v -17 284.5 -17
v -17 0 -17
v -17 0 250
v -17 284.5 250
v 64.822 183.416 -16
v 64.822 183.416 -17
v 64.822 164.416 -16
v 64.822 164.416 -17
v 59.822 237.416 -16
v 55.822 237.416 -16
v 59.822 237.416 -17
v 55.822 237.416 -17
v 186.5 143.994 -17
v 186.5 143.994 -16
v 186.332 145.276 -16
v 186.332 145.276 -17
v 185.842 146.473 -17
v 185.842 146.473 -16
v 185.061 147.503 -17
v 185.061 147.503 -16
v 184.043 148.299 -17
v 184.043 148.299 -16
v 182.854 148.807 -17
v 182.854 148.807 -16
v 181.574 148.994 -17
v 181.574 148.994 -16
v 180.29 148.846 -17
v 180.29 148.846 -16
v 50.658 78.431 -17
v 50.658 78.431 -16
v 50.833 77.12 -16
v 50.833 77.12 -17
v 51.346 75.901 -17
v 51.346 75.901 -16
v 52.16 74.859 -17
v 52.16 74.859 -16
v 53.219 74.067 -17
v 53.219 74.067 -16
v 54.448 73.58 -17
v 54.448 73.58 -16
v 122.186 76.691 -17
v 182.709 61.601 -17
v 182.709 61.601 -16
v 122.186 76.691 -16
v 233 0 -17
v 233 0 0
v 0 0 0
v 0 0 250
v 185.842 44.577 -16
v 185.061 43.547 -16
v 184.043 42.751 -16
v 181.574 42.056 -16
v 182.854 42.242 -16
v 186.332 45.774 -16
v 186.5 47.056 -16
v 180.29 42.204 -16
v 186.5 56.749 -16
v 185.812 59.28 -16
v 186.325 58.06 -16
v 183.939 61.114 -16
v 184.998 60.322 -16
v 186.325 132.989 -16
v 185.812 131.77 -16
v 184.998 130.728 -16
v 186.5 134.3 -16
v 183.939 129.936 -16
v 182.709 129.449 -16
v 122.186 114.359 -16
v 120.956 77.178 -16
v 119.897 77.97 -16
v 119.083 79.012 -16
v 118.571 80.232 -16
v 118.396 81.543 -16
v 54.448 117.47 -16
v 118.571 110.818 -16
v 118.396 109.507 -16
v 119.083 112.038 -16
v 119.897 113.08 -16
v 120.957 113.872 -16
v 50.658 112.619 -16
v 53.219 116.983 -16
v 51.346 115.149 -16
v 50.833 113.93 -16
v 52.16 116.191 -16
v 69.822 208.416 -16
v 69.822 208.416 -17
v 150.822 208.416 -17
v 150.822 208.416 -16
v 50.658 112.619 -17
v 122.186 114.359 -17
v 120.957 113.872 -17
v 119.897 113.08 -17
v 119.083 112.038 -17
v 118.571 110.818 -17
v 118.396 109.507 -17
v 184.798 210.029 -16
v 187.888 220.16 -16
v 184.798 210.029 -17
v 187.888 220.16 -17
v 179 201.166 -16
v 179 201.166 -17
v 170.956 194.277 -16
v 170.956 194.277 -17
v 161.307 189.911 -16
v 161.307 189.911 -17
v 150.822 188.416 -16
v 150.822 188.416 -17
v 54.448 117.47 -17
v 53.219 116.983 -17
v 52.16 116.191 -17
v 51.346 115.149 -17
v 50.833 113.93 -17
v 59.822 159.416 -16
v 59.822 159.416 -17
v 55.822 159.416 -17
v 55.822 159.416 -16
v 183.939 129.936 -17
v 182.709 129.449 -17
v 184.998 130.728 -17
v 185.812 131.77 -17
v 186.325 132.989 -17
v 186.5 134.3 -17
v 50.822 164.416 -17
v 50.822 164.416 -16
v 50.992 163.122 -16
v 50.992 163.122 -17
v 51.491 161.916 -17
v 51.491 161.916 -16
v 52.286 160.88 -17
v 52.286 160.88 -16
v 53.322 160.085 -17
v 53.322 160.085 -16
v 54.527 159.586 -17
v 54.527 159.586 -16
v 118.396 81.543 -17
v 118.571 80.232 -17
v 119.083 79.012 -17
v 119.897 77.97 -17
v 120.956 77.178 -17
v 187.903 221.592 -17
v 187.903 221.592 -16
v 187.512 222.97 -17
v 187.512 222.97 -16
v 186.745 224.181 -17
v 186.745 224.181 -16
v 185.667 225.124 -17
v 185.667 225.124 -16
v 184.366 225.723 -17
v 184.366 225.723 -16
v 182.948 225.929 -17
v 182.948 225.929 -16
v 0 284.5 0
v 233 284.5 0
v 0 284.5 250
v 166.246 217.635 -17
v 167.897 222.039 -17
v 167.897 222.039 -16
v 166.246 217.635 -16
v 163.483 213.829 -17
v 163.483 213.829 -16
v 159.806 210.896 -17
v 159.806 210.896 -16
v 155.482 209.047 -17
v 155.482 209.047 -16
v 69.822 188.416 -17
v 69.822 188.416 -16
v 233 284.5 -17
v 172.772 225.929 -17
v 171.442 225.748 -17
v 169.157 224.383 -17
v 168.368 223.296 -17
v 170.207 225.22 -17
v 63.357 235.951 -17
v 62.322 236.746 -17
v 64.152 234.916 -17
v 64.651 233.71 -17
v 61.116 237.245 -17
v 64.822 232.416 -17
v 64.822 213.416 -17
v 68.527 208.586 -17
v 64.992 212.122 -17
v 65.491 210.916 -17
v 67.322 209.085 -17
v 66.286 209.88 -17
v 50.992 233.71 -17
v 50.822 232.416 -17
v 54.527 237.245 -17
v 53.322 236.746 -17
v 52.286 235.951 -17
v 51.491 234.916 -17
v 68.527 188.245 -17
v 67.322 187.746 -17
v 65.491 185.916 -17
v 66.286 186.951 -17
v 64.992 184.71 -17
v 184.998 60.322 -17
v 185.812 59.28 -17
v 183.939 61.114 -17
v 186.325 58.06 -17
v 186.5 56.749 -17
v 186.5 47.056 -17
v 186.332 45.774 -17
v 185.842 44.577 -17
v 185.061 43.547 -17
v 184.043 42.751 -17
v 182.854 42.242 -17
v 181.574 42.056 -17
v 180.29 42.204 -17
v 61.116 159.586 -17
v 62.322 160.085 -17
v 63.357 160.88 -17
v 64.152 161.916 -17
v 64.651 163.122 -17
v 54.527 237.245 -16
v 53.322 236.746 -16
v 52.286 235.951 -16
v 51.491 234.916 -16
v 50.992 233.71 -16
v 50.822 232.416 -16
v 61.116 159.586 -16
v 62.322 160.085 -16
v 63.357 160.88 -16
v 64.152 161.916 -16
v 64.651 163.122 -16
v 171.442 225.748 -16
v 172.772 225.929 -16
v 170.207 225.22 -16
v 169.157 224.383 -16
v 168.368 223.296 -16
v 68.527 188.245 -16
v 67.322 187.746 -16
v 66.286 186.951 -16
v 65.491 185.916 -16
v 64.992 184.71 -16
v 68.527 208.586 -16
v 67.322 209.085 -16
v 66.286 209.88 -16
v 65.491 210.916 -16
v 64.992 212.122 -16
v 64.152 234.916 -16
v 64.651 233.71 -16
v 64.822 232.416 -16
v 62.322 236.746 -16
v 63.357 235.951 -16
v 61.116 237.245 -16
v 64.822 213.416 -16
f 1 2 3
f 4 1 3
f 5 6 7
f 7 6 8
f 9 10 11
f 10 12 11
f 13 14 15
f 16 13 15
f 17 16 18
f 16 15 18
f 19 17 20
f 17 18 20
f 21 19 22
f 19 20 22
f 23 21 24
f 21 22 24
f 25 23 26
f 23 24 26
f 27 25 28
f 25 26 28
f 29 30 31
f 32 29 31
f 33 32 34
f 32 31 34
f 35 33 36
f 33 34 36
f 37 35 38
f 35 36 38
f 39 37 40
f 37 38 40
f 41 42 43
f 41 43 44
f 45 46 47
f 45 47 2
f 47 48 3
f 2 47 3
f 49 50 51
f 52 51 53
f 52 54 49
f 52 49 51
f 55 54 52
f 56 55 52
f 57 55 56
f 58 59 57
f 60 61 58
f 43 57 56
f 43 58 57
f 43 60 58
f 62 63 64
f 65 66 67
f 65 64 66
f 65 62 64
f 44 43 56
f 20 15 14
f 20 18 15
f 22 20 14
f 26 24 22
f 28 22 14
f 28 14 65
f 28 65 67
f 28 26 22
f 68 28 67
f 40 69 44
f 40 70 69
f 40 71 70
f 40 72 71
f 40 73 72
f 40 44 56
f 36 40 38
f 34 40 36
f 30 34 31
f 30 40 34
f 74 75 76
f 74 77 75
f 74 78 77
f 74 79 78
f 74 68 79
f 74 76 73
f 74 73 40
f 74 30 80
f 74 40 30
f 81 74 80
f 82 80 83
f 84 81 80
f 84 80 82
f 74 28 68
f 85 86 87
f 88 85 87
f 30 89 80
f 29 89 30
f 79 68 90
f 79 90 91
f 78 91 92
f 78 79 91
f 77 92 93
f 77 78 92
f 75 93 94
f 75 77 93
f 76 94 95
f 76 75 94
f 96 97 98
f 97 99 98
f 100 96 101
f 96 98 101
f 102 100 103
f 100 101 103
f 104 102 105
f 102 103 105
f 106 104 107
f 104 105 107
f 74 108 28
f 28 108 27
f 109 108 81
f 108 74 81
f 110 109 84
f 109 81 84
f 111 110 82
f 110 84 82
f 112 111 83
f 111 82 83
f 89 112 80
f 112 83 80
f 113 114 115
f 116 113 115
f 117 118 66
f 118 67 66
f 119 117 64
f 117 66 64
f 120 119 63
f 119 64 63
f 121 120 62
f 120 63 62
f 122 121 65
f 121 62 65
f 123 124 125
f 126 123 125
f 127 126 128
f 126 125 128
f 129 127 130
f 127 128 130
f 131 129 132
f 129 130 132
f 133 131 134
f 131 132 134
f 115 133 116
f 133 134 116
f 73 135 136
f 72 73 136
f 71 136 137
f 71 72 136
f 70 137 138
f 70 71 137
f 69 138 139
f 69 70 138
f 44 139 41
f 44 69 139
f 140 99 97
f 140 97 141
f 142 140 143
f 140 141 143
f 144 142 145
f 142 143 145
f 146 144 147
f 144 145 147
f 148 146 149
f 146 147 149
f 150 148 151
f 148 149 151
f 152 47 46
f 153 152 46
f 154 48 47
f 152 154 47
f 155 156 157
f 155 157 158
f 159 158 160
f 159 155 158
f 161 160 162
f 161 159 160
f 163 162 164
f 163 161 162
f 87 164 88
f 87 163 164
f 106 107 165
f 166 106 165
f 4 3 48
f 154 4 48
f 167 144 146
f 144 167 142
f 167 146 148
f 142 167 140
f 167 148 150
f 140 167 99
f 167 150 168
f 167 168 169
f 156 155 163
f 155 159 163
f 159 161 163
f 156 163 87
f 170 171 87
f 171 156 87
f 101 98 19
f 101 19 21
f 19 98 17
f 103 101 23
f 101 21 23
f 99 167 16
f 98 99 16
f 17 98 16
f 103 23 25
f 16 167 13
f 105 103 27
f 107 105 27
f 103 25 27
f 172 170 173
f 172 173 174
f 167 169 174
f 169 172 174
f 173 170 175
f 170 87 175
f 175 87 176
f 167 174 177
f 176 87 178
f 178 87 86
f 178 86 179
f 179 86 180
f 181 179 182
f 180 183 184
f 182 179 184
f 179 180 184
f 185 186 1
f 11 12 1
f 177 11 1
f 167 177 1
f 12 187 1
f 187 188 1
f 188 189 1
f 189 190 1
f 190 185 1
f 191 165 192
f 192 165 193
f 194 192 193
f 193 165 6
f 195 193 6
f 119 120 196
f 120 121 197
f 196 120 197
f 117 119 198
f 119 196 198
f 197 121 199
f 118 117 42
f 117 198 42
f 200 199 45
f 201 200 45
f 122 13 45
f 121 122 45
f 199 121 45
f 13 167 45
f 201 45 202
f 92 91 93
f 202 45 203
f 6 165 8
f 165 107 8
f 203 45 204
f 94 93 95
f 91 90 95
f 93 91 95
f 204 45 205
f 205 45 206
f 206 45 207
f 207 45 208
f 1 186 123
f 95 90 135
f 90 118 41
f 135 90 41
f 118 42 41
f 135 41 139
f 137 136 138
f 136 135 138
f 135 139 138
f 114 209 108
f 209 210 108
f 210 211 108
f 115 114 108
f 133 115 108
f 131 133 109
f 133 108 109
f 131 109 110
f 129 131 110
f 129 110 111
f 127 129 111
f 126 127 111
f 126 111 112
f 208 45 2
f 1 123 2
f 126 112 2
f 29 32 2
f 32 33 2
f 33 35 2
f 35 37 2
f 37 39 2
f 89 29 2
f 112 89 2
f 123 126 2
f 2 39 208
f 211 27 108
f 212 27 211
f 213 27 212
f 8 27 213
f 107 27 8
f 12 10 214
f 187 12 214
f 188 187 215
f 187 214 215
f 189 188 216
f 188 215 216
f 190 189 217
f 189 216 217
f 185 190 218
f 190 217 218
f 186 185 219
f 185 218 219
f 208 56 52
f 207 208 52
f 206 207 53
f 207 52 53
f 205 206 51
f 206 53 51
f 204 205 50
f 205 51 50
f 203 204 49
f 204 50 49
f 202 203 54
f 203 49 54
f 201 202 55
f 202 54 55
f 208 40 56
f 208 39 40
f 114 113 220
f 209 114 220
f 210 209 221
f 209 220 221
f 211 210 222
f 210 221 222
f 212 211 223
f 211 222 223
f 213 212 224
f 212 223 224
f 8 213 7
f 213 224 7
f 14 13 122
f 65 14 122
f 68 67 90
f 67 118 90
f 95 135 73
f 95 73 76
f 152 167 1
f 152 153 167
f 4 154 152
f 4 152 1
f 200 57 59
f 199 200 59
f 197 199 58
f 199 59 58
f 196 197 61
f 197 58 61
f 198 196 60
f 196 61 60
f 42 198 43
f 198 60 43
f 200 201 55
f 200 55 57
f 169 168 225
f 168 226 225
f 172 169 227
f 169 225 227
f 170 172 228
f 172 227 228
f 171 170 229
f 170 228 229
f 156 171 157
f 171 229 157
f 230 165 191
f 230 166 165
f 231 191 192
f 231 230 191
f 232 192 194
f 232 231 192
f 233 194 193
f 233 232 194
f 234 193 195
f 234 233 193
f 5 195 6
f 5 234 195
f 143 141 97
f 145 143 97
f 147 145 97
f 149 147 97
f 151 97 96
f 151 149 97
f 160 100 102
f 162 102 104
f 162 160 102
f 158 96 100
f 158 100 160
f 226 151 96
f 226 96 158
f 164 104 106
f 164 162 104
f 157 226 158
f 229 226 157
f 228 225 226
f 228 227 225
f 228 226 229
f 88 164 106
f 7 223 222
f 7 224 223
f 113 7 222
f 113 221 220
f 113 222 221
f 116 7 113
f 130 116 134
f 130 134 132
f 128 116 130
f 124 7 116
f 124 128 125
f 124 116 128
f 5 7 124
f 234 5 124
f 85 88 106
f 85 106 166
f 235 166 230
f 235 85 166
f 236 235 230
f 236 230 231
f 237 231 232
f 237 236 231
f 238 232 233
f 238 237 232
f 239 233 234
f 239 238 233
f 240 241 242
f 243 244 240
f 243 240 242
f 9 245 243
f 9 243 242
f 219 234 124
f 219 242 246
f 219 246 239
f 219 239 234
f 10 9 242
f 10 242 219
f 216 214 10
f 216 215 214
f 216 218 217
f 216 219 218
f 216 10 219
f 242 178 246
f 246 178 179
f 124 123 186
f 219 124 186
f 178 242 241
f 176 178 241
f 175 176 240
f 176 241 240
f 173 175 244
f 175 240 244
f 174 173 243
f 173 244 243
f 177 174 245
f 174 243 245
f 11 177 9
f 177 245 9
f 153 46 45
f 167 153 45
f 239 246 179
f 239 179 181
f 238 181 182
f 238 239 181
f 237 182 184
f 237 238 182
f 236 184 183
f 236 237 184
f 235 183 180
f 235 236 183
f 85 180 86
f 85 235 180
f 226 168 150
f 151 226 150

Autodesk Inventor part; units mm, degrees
ref_plane "YZ Plane" through (0, 0, 0) normal (1, 0, 0) x (0, 1, 0)
ref_plane "XZ Plane" through (0, 0, 0) normal (0, 1, 0) x (-1, 0, 0)
ref_plane "XY Plane" through (0, 0, 0) normal (0, 0, 1) x (1, 0, 0)
sketch "Sketch1" plane through (0, 0, 0) normal (0, 1, 0) x (-1, 0, 0)
  line L0 (17, 250) -> (0, 250)
  line L1 (0, 250) -> (0, 0)
  line L2 (0, 0) -> (17, 0)
  line L3 (17, 0) -> (17, 250)
  line L4 (17, 0) -> (-233, 0)
  line L5 (-233, 0) -> (-233, -17)
  line L6 (-233, -17) -> (17, -17)
  line L7 (17, -17) -> (17, 0)
  dimension "d0" = 17
  dimension "d1" = 250
  dimension "d2" = 250
extrude "Extrusion1" add sketch "Sketch1" along normal blind 284.5
sketch "Sketch2" plane through (233, 0, -17) normal (0, 0, -1) x (-1, 0, 0)
  line L0 (0, 0) -> (250, 0) projected
  line L1 (250, 0) -> (250, 284.5) projected
  line L2 (0, 284.5) -> (250, 284.5) projected
  line L3 (0, 0) -> (0, 284.5) projected
  line L4 (182.1785, 237.4156) -> (168.1785, 237.4156)
  line L5 (168.1785, 237.4156) -> (168.1785, 159.4156)
  line L6 (168.1785, 159.4156) -> (182.1785, 159.4156)
  line L7 (182.1785, 159.4156) -> (182.1785, 237.4156)
  line L8 (168.1785, 208.4156) -> (82.1785, 208.4156)
  line L9 (82.1785, 208.4156) -> (82.1785, 188.4156)
  line L10 (82.1785, 188.4156) -> (168.1785, 188.4156)
  line L11 (168.1785, 188.4156) -> (168.1785, 208.4156)
  arc A0 (64.6656, 225.9286) -> (82.1785, 208.4156) centre (82.1785, 225.9286) ccw
  line L12 (82.1785, 225.9286) -> (64.6656, 225.9286) construction
  line L13 (82.1785, 225.9286) -> (82.1785, 208.4156) construction
  arc A1 (44.6656, 225.9286) -> (82.1785, 188.4156) centre (82.1785, 225.9286) ccw
  line L14 (64.6656, 225.9286) -> (44.6656, 225.9286)
  line L15 (182.3419, 116.525) -> (46.5005, 150.394)
  line L16 (46.5005, 150.394) -> (46.5005, 130.394)
  line L17 (46.5005, 130.394) -> (114.6042, 113.4139)
  line L18 (114.6042, 113.4139) -> (114.6042, 93.4139)
  line L19 (182.3419, 116.525) -> (182.3419, 95.525)
  line L20 (133.1096, 95.525) -> (42.0362, 95.525)
  line L21 (182.3419, 74.525) -> (46.5005, 40.6559)
  line L22 (46.5005, 40.6559) -> (46.5005, 60.6559)
  line L23 (46.5005, 60.6559) -> (114.6042, 77.6361)
  line L24 (114.6042, 77.6361) -> (114.6042, 97.6361)
  line L25 (182.3419, 74.525) -> (182.3419, 95.525)
  point P0 (233, 0)
  dimension "d5" = 90
  dimension "d6" = 21
  dimension "d7" = 140
  dimension "d8" = 20
  dimension "d9" = 20
  dimension "d12" = 68.1037
  dimension "d13" = 78
  dimension "d14" = 20
  dimension "d15" = 29
  dimension "d16" = 14
  dimension "d18" = 86
  dimension "d20" = 76
extrude "Extrusion2" cut sketch "Sketch2" against normal blind 1 contours L7 L6 L5 L4 | L5 L10 L9 L8 | L9 A1 L14 A0 | L19 L25 L21 L22 L23 L24 L18 L17 L16 L15
fillet "Fillet1" radius 5 16 edges at (50.6581, 116.525, -16.5) (50.6581, 74.525, -16.5) (50.8215, 159.4156, -16.5) (64.8215, 188.4156, -16.5) (118.3958, 113.4139, -16.5) (118.3958, 77.6361, -16.5) (186.4995, 40.6559, -16.5) (186.4995, 60.6559, -16.5) (186.4995, 130.394, -16.5) (186.4995, 150.394, -16.5) (168.3344, 225.9286, -16.5) (188.3344, 225.9286, -16.5) (64.8215, 237.4156, -16.5) (50.8215, 237.4156, -16.5) (64.8215, 159.4156, -16.5) (64.8215, 208.4156, -16.5)
equation "\"d15\" = 0.5 * d13 - 0.5 * d14"
properties part number "TableroEscritoSimplificado"
